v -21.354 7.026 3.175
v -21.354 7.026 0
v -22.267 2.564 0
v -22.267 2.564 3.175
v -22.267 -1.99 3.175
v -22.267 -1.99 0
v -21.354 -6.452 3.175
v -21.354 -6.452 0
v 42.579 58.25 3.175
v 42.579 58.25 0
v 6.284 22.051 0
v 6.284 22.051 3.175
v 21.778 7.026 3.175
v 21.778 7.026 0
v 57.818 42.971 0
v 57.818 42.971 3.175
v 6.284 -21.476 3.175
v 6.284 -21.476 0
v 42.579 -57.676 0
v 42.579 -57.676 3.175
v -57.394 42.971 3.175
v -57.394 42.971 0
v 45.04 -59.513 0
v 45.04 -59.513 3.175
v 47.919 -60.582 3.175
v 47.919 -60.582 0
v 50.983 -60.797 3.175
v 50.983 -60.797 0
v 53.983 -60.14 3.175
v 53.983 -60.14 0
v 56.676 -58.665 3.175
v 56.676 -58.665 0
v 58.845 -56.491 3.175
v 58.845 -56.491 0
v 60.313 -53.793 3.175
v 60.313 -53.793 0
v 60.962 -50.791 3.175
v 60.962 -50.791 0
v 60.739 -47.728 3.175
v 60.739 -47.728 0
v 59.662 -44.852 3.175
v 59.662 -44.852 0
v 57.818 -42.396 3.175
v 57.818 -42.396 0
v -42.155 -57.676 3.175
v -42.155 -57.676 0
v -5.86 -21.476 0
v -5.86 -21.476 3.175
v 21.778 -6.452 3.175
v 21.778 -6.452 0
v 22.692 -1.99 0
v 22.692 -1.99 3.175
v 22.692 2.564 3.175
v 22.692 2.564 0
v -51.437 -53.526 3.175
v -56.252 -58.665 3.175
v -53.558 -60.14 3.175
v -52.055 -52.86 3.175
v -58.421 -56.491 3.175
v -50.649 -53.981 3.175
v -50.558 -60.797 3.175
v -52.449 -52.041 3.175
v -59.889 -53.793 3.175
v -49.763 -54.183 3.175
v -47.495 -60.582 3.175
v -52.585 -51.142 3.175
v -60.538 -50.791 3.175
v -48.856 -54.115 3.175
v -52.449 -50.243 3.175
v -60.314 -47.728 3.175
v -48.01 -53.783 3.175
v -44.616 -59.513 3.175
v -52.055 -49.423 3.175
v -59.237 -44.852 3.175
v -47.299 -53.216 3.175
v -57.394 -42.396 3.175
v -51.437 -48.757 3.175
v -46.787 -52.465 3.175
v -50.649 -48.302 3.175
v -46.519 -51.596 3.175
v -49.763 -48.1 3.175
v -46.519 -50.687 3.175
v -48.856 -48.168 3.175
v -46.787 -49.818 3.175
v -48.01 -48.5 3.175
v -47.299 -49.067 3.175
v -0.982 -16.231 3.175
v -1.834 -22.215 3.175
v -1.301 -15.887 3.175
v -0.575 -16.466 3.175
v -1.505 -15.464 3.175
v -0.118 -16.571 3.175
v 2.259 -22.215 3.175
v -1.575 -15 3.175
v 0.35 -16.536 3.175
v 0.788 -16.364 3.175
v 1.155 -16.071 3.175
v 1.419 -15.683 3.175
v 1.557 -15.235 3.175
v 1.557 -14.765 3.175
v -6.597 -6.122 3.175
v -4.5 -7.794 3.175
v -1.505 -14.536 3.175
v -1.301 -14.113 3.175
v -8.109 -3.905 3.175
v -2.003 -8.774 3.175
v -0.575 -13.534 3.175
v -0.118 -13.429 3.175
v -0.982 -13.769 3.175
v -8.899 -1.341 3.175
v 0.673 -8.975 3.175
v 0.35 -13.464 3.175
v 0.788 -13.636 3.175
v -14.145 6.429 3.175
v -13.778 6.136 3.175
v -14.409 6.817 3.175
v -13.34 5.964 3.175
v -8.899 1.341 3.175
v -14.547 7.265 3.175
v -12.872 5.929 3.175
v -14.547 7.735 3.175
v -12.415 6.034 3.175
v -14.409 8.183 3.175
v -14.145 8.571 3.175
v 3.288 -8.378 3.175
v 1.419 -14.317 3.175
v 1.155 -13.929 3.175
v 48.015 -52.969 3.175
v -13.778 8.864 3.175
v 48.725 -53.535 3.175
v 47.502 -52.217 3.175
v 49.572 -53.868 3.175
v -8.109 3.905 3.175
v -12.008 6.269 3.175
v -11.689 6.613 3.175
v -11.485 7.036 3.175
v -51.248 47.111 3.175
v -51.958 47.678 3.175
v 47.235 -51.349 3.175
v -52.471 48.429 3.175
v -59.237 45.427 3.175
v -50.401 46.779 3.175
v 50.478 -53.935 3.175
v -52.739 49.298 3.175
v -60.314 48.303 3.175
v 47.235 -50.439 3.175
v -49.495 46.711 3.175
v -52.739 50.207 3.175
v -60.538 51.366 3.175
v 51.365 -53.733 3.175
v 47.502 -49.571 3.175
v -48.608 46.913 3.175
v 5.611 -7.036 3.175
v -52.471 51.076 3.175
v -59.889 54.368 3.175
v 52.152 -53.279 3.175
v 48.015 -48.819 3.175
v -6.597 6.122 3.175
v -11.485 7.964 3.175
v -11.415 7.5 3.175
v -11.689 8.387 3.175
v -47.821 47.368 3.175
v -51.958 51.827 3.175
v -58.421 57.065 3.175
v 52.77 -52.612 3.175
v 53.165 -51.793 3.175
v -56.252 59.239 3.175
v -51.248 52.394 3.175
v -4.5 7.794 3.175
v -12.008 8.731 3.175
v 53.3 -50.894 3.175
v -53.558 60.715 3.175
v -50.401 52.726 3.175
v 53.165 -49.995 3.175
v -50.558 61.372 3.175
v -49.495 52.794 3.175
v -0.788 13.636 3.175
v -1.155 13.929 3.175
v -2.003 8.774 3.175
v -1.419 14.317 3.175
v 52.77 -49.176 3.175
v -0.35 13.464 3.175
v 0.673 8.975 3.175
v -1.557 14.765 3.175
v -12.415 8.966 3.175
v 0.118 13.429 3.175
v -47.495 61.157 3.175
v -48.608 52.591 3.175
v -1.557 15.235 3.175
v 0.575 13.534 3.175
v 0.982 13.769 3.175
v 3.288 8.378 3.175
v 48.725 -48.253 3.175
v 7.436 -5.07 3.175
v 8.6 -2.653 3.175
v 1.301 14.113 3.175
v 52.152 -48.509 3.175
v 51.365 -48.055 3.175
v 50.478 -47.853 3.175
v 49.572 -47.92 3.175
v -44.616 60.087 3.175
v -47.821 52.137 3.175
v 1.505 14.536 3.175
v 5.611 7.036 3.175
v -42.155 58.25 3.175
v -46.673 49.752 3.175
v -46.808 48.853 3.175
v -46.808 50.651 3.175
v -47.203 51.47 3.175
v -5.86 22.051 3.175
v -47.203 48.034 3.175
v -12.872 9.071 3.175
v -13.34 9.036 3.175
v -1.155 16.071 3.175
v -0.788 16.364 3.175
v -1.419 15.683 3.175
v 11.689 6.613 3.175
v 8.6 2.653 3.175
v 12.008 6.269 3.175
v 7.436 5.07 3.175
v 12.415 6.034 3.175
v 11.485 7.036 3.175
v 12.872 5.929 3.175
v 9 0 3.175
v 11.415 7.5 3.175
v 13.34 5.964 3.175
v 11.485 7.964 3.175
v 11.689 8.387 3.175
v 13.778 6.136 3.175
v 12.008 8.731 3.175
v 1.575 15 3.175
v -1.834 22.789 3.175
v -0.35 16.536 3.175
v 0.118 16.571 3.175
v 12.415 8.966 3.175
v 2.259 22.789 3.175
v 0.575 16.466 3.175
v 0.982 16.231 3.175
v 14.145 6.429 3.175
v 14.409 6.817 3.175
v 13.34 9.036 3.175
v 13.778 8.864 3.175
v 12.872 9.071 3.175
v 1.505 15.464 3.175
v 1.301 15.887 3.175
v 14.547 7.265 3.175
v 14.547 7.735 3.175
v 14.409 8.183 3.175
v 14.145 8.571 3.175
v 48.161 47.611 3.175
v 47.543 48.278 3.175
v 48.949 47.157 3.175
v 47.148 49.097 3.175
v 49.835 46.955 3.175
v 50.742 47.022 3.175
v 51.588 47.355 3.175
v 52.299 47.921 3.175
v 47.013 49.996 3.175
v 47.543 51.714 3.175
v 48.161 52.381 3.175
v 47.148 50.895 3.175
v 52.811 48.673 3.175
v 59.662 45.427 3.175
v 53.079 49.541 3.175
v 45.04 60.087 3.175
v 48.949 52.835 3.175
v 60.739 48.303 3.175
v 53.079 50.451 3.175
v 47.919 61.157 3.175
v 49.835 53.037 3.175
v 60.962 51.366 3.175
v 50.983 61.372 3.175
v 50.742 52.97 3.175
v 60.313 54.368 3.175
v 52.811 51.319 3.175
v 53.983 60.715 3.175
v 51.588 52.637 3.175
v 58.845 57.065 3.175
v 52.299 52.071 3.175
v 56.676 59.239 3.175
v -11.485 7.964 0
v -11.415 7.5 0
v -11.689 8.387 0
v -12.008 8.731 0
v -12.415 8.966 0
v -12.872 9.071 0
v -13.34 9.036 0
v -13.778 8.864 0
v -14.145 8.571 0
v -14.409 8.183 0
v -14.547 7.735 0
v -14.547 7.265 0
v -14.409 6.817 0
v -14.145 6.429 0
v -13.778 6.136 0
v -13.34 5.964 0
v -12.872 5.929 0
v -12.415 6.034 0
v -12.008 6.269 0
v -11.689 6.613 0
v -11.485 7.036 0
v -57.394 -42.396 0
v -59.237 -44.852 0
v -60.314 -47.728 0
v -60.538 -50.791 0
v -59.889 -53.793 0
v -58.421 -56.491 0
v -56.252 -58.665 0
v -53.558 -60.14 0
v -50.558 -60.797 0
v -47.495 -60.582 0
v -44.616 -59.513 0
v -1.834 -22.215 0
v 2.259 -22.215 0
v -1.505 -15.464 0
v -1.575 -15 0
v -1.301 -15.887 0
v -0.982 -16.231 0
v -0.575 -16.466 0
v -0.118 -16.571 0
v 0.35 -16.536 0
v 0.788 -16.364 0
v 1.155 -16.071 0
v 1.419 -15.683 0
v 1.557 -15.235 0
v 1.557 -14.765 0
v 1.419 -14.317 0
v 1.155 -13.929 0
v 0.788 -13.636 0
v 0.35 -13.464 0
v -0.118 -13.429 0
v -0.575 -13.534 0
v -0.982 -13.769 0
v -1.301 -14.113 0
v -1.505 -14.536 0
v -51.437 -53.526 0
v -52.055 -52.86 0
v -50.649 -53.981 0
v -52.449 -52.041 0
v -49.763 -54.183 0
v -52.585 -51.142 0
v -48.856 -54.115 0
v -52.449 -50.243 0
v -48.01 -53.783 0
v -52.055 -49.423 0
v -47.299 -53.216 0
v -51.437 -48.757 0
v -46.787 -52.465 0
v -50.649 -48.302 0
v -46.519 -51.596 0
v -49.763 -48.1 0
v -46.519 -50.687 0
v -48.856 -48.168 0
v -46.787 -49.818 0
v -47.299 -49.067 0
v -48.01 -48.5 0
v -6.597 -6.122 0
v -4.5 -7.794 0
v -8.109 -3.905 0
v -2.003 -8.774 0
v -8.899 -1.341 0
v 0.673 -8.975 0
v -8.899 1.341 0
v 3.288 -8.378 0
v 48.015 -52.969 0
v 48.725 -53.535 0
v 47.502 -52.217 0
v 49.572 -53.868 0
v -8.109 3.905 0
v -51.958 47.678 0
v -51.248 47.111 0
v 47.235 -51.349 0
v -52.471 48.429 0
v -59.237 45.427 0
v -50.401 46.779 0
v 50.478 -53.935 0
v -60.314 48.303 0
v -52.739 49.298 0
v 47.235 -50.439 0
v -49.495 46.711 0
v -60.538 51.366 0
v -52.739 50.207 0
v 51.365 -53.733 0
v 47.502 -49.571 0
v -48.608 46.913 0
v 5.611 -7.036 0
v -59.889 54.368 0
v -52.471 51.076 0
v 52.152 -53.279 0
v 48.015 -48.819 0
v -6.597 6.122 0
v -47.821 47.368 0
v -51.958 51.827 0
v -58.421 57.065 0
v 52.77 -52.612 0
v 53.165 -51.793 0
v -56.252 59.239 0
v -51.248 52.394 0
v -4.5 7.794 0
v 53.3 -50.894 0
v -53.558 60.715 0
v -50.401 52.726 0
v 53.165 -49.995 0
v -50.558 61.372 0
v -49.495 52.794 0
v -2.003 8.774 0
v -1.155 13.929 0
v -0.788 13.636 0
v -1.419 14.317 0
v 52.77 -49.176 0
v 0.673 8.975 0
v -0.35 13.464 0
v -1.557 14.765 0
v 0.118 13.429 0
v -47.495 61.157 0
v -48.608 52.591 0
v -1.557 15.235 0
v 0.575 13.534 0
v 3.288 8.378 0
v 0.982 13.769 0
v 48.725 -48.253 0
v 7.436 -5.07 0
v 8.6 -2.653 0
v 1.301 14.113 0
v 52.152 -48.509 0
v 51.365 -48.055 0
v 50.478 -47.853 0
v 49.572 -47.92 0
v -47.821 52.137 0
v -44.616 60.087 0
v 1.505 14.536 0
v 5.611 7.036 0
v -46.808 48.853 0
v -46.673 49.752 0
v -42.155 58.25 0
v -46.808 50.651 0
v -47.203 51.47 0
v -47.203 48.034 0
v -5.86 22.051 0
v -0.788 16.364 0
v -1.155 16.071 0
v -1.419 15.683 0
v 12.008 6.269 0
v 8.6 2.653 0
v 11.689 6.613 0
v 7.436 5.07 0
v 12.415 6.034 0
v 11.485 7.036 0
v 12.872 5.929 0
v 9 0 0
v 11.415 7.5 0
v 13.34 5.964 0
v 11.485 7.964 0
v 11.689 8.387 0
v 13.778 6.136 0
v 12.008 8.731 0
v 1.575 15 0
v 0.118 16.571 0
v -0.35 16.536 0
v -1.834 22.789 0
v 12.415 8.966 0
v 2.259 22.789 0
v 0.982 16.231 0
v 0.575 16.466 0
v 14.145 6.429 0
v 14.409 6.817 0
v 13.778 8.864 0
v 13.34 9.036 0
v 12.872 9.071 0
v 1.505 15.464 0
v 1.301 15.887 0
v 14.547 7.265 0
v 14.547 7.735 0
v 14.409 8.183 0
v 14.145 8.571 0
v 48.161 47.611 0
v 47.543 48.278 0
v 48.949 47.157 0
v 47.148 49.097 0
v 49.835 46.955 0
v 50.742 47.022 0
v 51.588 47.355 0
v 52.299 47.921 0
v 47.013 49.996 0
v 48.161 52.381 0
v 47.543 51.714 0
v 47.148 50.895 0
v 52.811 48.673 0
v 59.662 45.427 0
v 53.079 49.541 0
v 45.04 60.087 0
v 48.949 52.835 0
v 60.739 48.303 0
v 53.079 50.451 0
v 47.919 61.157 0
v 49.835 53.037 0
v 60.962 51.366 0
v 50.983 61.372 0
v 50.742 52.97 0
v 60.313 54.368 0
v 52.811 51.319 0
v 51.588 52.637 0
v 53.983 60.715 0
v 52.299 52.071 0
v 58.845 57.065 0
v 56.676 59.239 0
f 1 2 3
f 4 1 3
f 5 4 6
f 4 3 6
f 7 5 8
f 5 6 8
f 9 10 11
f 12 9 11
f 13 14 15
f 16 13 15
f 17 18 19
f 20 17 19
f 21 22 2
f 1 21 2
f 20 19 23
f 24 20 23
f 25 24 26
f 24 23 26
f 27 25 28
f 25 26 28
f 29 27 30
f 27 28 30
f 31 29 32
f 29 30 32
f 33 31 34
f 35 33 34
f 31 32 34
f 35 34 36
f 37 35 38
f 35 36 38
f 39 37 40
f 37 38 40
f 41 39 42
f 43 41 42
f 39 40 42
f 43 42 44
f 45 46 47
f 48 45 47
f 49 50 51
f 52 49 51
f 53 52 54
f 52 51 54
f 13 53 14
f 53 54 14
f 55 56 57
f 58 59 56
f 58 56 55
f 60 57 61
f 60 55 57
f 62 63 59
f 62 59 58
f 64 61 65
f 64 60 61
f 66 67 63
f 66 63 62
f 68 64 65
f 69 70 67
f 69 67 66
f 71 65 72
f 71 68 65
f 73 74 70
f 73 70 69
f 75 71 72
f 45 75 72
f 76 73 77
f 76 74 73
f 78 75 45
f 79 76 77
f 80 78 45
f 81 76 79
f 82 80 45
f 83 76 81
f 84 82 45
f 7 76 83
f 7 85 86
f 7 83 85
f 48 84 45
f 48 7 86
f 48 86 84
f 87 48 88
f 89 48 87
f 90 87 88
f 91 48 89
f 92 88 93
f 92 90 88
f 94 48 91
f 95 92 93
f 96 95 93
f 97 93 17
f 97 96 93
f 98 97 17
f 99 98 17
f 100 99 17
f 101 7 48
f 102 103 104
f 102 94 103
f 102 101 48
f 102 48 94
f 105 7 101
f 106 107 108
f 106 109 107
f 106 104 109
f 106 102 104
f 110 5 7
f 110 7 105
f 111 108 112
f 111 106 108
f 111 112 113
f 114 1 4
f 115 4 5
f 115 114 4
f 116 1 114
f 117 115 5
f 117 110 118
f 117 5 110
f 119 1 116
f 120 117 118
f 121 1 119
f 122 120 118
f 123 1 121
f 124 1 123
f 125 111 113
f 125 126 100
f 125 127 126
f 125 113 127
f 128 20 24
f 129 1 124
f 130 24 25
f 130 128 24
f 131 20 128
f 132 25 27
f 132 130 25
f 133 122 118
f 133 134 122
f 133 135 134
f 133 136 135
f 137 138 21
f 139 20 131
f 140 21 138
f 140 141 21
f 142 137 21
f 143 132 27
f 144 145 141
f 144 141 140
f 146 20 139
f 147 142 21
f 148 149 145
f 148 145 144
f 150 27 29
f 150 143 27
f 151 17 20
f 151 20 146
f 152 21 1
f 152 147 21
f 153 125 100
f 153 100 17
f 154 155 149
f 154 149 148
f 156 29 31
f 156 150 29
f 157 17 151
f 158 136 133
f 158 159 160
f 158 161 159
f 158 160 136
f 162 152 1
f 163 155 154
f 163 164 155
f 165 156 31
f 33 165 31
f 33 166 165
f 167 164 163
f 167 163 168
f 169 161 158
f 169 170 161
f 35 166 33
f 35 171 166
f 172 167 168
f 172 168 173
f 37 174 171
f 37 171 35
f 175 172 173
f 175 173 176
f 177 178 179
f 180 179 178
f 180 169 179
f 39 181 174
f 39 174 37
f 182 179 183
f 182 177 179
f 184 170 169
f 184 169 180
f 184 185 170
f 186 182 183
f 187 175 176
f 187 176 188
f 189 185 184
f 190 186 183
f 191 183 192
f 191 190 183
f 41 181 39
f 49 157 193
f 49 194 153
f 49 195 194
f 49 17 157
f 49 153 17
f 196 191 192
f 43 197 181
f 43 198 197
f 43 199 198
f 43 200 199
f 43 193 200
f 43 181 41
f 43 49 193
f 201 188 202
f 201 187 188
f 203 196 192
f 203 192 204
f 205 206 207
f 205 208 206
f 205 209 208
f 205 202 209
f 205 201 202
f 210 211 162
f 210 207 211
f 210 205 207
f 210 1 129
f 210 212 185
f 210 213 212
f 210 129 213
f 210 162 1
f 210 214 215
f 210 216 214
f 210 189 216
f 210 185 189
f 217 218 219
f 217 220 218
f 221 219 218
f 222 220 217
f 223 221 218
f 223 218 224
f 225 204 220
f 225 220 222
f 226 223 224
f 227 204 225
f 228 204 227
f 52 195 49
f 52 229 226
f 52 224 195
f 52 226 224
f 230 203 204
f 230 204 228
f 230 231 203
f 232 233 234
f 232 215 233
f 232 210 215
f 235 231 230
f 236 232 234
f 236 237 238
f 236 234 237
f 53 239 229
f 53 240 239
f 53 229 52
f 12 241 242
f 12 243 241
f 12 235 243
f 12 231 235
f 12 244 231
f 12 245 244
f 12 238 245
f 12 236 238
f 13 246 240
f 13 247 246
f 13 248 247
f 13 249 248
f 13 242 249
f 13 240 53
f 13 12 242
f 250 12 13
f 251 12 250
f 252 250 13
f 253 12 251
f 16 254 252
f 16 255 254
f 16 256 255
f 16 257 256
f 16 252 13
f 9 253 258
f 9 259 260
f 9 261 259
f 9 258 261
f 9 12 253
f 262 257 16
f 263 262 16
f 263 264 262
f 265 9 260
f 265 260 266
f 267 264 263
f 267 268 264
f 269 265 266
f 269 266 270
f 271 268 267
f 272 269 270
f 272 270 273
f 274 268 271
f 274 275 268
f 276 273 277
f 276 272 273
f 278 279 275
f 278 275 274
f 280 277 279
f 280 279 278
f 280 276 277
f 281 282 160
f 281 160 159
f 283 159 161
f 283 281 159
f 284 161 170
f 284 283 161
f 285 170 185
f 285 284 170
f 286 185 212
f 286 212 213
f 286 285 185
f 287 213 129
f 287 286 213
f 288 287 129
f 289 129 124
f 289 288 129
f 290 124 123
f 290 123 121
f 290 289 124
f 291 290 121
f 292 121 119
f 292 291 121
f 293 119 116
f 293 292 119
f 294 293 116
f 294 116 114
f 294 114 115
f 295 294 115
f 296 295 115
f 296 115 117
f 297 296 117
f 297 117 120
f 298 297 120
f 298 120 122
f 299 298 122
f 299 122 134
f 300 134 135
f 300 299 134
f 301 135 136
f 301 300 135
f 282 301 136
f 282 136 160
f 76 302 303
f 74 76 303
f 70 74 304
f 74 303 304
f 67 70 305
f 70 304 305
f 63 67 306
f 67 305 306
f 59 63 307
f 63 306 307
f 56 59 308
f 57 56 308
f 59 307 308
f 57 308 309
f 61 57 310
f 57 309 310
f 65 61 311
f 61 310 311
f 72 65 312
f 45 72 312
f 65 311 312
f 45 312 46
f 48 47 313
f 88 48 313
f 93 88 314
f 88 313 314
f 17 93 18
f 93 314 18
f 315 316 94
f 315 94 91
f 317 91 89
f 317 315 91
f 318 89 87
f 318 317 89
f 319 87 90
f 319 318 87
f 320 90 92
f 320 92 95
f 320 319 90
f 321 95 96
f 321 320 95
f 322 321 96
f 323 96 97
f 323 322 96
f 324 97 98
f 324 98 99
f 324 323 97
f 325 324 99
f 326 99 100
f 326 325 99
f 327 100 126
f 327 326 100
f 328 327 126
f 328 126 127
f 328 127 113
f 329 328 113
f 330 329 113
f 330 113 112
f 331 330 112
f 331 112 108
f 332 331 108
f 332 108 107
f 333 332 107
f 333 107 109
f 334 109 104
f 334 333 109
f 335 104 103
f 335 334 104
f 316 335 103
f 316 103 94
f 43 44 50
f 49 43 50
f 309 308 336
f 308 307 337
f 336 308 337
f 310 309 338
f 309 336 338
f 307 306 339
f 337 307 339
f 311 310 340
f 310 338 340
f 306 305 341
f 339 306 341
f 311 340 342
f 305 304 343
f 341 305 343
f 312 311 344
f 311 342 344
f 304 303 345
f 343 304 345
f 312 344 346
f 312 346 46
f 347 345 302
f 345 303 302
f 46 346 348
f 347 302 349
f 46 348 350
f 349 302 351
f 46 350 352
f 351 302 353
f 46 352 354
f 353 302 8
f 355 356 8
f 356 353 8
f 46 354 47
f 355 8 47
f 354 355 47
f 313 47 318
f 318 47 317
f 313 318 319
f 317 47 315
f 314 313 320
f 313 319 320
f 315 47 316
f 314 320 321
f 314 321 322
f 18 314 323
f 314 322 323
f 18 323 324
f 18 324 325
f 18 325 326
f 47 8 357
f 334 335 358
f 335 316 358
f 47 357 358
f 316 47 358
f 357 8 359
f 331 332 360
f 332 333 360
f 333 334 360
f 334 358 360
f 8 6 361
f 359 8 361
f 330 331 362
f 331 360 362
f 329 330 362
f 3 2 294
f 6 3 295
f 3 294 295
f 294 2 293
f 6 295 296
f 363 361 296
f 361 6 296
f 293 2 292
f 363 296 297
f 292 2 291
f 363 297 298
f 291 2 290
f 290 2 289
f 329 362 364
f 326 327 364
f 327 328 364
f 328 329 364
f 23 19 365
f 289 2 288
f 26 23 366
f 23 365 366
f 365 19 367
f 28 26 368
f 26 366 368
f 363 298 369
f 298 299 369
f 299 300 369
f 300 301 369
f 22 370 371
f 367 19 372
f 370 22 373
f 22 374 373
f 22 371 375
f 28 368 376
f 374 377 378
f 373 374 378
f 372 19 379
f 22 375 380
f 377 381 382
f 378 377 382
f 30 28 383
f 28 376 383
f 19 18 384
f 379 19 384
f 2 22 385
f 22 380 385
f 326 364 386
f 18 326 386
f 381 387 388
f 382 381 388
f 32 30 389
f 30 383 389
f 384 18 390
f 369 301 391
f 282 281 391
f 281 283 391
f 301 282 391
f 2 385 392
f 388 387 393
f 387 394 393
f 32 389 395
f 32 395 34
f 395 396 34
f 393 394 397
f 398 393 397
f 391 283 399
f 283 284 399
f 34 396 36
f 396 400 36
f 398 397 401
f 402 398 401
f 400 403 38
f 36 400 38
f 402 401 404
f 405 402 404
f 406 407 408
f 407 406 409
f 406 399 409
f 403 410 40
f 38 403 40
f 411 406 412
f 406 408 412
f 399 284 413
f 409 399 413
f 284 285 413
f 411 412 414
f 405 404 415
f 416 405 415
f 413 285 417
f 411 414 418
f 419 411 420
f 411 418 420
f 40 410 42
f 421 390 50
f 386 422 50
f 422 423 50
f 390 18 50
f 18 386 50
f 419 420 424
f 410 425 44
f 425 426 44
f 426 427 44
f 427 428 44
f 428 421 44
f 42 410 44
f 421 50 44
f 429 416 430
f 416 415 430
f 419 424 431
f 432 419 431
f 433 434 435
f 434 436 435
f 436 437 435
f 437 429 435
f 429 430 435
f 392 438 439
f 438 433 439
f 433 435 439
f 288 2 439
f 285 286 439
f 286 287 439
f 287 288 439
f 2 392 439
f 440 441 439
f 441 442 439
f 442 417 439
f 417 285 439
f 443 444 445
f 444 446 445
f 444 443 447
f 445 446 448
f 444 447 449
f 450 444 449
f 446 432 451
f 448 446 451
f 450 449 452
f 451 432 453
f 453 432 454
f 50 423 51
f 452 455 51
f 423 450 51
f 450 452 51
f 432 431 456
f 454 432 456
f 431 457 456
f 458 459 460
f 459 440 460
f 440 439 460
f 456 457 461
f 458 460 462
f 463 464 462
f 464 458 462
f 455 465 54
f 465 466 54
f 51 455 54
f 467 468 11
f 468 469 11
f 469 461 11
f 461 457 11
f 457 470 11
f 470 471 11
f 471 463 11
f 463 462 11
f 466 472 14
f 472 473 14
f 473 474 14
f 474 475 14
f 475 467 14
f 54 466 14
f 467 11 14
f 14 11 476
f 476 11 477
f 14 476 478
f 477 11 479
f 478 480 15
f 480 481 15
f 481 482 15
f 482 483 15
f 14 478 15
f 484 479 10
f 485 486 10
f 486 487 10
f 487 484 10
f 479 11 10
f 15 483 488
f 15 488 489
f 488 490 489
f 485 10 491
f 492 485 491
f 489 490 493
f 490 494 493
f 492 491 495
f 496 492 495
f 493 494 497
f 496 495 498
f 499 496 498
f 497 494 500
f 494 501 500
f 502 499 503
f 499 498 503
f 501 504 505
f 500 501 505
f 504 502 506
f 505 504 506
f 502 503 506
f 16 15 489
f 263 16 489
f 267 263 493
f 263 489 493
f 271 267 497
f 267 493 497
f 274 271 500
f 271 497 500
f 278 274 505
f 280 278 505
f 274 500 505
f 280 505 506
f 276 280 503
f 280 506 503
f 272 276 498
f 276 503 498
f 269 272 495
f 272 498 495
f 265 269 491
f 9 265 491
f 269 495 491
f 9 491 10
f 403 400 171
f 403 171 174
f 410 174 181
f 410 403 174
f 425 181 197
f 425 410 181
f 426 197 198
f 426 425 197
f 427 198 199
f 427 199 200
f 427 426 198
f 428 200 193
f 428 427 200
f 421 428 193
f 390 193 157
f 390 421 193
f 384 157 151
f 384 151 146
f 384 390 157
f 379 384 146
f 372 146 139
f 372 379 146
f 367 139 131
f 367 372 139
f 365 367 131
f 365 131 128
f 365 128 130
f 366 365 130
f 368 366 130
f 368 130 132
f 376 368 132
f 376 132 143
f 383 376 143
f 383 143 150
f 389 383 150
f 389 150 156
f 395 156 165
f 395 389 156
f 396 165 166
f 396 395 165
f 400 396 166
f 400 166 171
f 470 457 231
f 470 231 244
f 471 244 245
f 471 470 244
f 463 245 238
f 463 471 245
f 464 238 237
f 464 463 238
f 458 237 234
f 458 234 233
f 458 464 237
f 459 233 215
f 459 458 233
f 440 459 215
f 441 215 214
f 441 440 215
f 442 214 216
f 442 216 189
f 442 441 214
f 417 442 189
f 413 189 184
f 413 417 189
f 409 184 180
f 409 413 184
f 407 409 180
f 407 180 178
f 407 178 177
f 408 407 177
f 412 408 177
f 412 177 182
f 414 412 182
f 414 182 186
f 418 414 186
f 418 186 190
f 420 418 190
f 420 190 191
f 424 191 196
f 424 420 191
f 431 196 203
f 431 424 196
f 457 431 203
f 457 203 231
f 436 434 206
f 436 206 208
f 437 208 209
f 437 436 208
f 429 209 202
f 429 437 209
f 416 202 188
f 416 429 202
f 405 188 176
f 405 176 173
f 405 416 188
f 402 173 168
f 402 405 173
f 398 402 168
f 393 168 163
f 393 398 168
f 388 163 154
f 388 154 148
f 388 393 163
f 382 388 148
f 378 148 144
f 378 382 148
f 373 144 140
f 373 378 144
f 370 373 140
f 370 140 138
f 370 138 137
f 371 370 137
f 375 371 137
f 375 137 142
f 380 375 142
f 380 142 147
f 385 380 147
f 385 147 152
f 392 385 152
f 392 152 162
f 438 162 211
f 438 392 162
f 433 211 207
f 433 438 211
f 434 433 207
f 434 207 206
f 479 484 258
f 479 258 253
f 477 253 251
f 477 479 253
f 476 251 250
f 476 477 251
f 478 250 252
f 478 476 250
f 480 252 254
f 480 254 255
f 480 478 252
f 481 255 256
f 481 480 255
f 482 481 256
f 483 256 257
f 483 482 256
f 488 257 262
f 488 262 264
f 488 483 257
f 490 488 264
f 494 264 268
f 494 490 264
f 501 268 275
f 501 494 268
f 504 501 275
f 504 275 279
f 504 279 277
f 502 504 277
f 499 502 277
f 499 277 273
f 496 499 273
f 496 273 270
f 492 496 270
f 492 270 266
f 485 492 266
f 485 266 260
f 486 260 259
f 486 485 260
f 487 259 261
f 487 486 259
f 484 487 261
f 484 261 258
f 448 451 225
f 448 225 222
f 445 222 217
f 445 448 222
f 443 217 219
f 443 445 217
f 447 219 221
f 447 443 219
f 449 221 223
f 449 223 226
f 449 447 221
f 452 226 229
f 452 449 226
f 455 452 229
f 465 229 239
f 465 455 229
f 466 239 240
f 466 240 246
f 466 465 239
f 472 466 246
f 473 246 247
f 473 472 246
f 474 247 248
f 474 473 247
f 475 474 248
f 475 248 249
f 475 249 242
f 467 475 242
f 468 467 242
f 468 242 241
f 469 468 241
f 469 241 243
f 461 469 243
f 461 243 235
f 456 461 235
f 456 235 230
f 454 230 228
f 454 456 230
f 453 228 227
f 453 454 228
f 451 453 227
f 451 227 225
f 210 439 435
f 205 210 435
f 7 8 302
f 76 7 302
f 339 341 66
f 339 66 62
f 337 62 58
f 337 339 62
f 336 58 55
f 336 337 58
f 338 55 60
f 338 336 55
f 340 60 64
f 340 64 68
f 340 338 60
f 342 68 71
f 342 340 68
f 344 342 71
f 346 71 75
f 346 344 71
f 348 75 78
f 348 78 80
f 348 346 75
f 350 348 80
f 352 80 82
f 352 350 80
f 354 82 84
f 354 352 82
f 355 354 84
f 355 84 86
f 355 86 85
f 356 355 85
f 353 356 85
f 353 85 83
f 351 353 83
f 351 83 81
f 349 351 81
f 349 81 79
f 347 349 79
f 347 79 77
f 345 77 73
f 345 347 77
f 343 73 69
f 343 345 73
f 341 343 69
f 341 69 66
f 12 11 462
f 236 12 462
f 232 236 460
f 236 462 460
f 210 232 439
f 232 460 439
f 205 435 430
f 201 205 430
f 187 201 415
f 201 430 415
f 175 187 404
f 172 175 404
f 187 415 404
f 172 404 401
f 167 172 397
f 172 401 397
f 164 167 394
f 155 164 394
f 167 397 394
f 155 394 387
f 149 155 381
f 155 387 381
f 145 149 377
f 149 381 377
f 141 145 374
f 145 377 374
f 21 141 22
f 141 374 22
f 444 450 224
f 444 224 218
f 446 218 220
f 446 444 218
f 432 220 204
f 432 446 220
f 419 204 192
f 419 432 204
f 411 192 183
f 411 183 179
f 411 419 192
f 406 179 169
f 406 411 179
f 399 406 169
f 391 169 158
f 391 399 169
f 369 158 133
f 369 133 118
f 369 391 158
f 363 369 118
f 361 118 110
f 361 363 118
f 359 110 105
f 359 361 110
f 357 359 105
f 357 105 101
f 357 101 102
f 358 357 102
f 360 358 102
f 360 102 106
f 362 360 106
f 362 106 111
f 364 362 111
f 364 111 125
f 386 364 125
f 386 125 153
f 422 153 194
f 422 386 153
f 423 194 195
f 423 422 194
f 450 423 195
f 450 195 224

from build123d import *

# Parameters (mm, degrees)
MODEL_R             = 1.575000001
MODEL_R_2           = 3.05
MODEL_R_3           = 9.000000001
BOSS_EXTRUDE1_DEPTH = 3.175


with BuildPart() as part:
    # Model → Boss-Extrude1 (new body)
    with BuildSketch(Plane.XY):
        with BuildLine():
            Line((-57.393758137, 42.970698671), (-21.353966815, 7.026278384))
            ThreePointArc((-21.353966815, 7.026278384), (-22.382377018, 0.28718893), (-21.353966815, -6.451900523))
            Line((-21.353966815, -6.451900523), (-57.393758137, -42.39632081))
            ThreePointArc((-57.393758137, -42.39632081), (-57.413974609, -57.655322639), (-42.15497278, -57.675539111))
            Line((-42.15497278, -57.675539111), (-5.859634798, -21.47624841))
            ThreePointArc((-5.859634798, -21.47624841), (0.212184024, -22.307372111), (6.284002846, -21.47624841))
            Line((6.284002846, -21.47624841), (42.579340828, -57.675539111))
            ThreePointArc((42.579340828, -57.675539111), (57.838342657, -57.655322639), (57.818126185, -42.39632081))
            Line((57.818126185, -42.39632081), (21.778334863, -6.451900523))
            ThreePointArc((21.778334863, -6.451900523), (22.806745065, 0.28718893), (21.778334863, 7.026278384))
            Line((21.778334863, 7.026278384), (57.818126185, 42.970698671))
            ThreePointArc((57.818126185, 42.970698671), (57.838342657, 58.229700499), (42.579340828, 58.249916972))
            Line((42.579340828, 58.249916972), (6.284002846, 22.05062627))
            ThreePointArc((6.284002846, 22.05062627), (0.212184024, 22.881749972), (-5.859634798, 22.05062627))
            Line((-5.859634798, 22.05062627), (-42.15497278, 58.249916972))
            ThreePointArc((-42.15497278, 58.249916972), (-57.413974609, 58.229700499), (-57.393758137, 42.970698671))
        make_face()
        with Locations((0, 15)):
            Circle(MODEL_R, mode=Mode.SUBTRACT)
        with Locations((-49.72265974, 49.752211816)):
            Circle(MODEL_R_2, mode=Mode.SUBTRACT)
        with Locations(Location((50.062895685, 49.995974034, 0), (0, 0, 180))):
            Circle(MODEL_R_2, mode=Mode.SUBTRACT)
        with Locations((50.250439225, -50.894025966)):
            Circle(MODEL_R_2, mode=Mode.SUBTRACT)
        with Locations(Location((-49.534886134, -51.141545777, 0), (0, 0, 180))):
            Circle(MODEL_R_2, mode=Mode.SUBTRACT)
        with Locations((-12.99, 7.5)):
            Circle(MODEL_R, mode=Mode.SUBTRACT)
        with Locations(Location((12.99, 7.5, 0), (0, 0, 180))):
            Circle(MODEL_R, mode=Mode.SUBTRACT)
        Circle(MODEL_R_3, mode=Mode.SUBTRACT)
        with Locations(Location((0, -15, 0), (0, 0, 180))):
            Circle(MODEL_R, mode=Mode.SUBTRACT)
    extrude(amount=BOSS_EXTRUDE1_DEPTH)


solid = part.part
